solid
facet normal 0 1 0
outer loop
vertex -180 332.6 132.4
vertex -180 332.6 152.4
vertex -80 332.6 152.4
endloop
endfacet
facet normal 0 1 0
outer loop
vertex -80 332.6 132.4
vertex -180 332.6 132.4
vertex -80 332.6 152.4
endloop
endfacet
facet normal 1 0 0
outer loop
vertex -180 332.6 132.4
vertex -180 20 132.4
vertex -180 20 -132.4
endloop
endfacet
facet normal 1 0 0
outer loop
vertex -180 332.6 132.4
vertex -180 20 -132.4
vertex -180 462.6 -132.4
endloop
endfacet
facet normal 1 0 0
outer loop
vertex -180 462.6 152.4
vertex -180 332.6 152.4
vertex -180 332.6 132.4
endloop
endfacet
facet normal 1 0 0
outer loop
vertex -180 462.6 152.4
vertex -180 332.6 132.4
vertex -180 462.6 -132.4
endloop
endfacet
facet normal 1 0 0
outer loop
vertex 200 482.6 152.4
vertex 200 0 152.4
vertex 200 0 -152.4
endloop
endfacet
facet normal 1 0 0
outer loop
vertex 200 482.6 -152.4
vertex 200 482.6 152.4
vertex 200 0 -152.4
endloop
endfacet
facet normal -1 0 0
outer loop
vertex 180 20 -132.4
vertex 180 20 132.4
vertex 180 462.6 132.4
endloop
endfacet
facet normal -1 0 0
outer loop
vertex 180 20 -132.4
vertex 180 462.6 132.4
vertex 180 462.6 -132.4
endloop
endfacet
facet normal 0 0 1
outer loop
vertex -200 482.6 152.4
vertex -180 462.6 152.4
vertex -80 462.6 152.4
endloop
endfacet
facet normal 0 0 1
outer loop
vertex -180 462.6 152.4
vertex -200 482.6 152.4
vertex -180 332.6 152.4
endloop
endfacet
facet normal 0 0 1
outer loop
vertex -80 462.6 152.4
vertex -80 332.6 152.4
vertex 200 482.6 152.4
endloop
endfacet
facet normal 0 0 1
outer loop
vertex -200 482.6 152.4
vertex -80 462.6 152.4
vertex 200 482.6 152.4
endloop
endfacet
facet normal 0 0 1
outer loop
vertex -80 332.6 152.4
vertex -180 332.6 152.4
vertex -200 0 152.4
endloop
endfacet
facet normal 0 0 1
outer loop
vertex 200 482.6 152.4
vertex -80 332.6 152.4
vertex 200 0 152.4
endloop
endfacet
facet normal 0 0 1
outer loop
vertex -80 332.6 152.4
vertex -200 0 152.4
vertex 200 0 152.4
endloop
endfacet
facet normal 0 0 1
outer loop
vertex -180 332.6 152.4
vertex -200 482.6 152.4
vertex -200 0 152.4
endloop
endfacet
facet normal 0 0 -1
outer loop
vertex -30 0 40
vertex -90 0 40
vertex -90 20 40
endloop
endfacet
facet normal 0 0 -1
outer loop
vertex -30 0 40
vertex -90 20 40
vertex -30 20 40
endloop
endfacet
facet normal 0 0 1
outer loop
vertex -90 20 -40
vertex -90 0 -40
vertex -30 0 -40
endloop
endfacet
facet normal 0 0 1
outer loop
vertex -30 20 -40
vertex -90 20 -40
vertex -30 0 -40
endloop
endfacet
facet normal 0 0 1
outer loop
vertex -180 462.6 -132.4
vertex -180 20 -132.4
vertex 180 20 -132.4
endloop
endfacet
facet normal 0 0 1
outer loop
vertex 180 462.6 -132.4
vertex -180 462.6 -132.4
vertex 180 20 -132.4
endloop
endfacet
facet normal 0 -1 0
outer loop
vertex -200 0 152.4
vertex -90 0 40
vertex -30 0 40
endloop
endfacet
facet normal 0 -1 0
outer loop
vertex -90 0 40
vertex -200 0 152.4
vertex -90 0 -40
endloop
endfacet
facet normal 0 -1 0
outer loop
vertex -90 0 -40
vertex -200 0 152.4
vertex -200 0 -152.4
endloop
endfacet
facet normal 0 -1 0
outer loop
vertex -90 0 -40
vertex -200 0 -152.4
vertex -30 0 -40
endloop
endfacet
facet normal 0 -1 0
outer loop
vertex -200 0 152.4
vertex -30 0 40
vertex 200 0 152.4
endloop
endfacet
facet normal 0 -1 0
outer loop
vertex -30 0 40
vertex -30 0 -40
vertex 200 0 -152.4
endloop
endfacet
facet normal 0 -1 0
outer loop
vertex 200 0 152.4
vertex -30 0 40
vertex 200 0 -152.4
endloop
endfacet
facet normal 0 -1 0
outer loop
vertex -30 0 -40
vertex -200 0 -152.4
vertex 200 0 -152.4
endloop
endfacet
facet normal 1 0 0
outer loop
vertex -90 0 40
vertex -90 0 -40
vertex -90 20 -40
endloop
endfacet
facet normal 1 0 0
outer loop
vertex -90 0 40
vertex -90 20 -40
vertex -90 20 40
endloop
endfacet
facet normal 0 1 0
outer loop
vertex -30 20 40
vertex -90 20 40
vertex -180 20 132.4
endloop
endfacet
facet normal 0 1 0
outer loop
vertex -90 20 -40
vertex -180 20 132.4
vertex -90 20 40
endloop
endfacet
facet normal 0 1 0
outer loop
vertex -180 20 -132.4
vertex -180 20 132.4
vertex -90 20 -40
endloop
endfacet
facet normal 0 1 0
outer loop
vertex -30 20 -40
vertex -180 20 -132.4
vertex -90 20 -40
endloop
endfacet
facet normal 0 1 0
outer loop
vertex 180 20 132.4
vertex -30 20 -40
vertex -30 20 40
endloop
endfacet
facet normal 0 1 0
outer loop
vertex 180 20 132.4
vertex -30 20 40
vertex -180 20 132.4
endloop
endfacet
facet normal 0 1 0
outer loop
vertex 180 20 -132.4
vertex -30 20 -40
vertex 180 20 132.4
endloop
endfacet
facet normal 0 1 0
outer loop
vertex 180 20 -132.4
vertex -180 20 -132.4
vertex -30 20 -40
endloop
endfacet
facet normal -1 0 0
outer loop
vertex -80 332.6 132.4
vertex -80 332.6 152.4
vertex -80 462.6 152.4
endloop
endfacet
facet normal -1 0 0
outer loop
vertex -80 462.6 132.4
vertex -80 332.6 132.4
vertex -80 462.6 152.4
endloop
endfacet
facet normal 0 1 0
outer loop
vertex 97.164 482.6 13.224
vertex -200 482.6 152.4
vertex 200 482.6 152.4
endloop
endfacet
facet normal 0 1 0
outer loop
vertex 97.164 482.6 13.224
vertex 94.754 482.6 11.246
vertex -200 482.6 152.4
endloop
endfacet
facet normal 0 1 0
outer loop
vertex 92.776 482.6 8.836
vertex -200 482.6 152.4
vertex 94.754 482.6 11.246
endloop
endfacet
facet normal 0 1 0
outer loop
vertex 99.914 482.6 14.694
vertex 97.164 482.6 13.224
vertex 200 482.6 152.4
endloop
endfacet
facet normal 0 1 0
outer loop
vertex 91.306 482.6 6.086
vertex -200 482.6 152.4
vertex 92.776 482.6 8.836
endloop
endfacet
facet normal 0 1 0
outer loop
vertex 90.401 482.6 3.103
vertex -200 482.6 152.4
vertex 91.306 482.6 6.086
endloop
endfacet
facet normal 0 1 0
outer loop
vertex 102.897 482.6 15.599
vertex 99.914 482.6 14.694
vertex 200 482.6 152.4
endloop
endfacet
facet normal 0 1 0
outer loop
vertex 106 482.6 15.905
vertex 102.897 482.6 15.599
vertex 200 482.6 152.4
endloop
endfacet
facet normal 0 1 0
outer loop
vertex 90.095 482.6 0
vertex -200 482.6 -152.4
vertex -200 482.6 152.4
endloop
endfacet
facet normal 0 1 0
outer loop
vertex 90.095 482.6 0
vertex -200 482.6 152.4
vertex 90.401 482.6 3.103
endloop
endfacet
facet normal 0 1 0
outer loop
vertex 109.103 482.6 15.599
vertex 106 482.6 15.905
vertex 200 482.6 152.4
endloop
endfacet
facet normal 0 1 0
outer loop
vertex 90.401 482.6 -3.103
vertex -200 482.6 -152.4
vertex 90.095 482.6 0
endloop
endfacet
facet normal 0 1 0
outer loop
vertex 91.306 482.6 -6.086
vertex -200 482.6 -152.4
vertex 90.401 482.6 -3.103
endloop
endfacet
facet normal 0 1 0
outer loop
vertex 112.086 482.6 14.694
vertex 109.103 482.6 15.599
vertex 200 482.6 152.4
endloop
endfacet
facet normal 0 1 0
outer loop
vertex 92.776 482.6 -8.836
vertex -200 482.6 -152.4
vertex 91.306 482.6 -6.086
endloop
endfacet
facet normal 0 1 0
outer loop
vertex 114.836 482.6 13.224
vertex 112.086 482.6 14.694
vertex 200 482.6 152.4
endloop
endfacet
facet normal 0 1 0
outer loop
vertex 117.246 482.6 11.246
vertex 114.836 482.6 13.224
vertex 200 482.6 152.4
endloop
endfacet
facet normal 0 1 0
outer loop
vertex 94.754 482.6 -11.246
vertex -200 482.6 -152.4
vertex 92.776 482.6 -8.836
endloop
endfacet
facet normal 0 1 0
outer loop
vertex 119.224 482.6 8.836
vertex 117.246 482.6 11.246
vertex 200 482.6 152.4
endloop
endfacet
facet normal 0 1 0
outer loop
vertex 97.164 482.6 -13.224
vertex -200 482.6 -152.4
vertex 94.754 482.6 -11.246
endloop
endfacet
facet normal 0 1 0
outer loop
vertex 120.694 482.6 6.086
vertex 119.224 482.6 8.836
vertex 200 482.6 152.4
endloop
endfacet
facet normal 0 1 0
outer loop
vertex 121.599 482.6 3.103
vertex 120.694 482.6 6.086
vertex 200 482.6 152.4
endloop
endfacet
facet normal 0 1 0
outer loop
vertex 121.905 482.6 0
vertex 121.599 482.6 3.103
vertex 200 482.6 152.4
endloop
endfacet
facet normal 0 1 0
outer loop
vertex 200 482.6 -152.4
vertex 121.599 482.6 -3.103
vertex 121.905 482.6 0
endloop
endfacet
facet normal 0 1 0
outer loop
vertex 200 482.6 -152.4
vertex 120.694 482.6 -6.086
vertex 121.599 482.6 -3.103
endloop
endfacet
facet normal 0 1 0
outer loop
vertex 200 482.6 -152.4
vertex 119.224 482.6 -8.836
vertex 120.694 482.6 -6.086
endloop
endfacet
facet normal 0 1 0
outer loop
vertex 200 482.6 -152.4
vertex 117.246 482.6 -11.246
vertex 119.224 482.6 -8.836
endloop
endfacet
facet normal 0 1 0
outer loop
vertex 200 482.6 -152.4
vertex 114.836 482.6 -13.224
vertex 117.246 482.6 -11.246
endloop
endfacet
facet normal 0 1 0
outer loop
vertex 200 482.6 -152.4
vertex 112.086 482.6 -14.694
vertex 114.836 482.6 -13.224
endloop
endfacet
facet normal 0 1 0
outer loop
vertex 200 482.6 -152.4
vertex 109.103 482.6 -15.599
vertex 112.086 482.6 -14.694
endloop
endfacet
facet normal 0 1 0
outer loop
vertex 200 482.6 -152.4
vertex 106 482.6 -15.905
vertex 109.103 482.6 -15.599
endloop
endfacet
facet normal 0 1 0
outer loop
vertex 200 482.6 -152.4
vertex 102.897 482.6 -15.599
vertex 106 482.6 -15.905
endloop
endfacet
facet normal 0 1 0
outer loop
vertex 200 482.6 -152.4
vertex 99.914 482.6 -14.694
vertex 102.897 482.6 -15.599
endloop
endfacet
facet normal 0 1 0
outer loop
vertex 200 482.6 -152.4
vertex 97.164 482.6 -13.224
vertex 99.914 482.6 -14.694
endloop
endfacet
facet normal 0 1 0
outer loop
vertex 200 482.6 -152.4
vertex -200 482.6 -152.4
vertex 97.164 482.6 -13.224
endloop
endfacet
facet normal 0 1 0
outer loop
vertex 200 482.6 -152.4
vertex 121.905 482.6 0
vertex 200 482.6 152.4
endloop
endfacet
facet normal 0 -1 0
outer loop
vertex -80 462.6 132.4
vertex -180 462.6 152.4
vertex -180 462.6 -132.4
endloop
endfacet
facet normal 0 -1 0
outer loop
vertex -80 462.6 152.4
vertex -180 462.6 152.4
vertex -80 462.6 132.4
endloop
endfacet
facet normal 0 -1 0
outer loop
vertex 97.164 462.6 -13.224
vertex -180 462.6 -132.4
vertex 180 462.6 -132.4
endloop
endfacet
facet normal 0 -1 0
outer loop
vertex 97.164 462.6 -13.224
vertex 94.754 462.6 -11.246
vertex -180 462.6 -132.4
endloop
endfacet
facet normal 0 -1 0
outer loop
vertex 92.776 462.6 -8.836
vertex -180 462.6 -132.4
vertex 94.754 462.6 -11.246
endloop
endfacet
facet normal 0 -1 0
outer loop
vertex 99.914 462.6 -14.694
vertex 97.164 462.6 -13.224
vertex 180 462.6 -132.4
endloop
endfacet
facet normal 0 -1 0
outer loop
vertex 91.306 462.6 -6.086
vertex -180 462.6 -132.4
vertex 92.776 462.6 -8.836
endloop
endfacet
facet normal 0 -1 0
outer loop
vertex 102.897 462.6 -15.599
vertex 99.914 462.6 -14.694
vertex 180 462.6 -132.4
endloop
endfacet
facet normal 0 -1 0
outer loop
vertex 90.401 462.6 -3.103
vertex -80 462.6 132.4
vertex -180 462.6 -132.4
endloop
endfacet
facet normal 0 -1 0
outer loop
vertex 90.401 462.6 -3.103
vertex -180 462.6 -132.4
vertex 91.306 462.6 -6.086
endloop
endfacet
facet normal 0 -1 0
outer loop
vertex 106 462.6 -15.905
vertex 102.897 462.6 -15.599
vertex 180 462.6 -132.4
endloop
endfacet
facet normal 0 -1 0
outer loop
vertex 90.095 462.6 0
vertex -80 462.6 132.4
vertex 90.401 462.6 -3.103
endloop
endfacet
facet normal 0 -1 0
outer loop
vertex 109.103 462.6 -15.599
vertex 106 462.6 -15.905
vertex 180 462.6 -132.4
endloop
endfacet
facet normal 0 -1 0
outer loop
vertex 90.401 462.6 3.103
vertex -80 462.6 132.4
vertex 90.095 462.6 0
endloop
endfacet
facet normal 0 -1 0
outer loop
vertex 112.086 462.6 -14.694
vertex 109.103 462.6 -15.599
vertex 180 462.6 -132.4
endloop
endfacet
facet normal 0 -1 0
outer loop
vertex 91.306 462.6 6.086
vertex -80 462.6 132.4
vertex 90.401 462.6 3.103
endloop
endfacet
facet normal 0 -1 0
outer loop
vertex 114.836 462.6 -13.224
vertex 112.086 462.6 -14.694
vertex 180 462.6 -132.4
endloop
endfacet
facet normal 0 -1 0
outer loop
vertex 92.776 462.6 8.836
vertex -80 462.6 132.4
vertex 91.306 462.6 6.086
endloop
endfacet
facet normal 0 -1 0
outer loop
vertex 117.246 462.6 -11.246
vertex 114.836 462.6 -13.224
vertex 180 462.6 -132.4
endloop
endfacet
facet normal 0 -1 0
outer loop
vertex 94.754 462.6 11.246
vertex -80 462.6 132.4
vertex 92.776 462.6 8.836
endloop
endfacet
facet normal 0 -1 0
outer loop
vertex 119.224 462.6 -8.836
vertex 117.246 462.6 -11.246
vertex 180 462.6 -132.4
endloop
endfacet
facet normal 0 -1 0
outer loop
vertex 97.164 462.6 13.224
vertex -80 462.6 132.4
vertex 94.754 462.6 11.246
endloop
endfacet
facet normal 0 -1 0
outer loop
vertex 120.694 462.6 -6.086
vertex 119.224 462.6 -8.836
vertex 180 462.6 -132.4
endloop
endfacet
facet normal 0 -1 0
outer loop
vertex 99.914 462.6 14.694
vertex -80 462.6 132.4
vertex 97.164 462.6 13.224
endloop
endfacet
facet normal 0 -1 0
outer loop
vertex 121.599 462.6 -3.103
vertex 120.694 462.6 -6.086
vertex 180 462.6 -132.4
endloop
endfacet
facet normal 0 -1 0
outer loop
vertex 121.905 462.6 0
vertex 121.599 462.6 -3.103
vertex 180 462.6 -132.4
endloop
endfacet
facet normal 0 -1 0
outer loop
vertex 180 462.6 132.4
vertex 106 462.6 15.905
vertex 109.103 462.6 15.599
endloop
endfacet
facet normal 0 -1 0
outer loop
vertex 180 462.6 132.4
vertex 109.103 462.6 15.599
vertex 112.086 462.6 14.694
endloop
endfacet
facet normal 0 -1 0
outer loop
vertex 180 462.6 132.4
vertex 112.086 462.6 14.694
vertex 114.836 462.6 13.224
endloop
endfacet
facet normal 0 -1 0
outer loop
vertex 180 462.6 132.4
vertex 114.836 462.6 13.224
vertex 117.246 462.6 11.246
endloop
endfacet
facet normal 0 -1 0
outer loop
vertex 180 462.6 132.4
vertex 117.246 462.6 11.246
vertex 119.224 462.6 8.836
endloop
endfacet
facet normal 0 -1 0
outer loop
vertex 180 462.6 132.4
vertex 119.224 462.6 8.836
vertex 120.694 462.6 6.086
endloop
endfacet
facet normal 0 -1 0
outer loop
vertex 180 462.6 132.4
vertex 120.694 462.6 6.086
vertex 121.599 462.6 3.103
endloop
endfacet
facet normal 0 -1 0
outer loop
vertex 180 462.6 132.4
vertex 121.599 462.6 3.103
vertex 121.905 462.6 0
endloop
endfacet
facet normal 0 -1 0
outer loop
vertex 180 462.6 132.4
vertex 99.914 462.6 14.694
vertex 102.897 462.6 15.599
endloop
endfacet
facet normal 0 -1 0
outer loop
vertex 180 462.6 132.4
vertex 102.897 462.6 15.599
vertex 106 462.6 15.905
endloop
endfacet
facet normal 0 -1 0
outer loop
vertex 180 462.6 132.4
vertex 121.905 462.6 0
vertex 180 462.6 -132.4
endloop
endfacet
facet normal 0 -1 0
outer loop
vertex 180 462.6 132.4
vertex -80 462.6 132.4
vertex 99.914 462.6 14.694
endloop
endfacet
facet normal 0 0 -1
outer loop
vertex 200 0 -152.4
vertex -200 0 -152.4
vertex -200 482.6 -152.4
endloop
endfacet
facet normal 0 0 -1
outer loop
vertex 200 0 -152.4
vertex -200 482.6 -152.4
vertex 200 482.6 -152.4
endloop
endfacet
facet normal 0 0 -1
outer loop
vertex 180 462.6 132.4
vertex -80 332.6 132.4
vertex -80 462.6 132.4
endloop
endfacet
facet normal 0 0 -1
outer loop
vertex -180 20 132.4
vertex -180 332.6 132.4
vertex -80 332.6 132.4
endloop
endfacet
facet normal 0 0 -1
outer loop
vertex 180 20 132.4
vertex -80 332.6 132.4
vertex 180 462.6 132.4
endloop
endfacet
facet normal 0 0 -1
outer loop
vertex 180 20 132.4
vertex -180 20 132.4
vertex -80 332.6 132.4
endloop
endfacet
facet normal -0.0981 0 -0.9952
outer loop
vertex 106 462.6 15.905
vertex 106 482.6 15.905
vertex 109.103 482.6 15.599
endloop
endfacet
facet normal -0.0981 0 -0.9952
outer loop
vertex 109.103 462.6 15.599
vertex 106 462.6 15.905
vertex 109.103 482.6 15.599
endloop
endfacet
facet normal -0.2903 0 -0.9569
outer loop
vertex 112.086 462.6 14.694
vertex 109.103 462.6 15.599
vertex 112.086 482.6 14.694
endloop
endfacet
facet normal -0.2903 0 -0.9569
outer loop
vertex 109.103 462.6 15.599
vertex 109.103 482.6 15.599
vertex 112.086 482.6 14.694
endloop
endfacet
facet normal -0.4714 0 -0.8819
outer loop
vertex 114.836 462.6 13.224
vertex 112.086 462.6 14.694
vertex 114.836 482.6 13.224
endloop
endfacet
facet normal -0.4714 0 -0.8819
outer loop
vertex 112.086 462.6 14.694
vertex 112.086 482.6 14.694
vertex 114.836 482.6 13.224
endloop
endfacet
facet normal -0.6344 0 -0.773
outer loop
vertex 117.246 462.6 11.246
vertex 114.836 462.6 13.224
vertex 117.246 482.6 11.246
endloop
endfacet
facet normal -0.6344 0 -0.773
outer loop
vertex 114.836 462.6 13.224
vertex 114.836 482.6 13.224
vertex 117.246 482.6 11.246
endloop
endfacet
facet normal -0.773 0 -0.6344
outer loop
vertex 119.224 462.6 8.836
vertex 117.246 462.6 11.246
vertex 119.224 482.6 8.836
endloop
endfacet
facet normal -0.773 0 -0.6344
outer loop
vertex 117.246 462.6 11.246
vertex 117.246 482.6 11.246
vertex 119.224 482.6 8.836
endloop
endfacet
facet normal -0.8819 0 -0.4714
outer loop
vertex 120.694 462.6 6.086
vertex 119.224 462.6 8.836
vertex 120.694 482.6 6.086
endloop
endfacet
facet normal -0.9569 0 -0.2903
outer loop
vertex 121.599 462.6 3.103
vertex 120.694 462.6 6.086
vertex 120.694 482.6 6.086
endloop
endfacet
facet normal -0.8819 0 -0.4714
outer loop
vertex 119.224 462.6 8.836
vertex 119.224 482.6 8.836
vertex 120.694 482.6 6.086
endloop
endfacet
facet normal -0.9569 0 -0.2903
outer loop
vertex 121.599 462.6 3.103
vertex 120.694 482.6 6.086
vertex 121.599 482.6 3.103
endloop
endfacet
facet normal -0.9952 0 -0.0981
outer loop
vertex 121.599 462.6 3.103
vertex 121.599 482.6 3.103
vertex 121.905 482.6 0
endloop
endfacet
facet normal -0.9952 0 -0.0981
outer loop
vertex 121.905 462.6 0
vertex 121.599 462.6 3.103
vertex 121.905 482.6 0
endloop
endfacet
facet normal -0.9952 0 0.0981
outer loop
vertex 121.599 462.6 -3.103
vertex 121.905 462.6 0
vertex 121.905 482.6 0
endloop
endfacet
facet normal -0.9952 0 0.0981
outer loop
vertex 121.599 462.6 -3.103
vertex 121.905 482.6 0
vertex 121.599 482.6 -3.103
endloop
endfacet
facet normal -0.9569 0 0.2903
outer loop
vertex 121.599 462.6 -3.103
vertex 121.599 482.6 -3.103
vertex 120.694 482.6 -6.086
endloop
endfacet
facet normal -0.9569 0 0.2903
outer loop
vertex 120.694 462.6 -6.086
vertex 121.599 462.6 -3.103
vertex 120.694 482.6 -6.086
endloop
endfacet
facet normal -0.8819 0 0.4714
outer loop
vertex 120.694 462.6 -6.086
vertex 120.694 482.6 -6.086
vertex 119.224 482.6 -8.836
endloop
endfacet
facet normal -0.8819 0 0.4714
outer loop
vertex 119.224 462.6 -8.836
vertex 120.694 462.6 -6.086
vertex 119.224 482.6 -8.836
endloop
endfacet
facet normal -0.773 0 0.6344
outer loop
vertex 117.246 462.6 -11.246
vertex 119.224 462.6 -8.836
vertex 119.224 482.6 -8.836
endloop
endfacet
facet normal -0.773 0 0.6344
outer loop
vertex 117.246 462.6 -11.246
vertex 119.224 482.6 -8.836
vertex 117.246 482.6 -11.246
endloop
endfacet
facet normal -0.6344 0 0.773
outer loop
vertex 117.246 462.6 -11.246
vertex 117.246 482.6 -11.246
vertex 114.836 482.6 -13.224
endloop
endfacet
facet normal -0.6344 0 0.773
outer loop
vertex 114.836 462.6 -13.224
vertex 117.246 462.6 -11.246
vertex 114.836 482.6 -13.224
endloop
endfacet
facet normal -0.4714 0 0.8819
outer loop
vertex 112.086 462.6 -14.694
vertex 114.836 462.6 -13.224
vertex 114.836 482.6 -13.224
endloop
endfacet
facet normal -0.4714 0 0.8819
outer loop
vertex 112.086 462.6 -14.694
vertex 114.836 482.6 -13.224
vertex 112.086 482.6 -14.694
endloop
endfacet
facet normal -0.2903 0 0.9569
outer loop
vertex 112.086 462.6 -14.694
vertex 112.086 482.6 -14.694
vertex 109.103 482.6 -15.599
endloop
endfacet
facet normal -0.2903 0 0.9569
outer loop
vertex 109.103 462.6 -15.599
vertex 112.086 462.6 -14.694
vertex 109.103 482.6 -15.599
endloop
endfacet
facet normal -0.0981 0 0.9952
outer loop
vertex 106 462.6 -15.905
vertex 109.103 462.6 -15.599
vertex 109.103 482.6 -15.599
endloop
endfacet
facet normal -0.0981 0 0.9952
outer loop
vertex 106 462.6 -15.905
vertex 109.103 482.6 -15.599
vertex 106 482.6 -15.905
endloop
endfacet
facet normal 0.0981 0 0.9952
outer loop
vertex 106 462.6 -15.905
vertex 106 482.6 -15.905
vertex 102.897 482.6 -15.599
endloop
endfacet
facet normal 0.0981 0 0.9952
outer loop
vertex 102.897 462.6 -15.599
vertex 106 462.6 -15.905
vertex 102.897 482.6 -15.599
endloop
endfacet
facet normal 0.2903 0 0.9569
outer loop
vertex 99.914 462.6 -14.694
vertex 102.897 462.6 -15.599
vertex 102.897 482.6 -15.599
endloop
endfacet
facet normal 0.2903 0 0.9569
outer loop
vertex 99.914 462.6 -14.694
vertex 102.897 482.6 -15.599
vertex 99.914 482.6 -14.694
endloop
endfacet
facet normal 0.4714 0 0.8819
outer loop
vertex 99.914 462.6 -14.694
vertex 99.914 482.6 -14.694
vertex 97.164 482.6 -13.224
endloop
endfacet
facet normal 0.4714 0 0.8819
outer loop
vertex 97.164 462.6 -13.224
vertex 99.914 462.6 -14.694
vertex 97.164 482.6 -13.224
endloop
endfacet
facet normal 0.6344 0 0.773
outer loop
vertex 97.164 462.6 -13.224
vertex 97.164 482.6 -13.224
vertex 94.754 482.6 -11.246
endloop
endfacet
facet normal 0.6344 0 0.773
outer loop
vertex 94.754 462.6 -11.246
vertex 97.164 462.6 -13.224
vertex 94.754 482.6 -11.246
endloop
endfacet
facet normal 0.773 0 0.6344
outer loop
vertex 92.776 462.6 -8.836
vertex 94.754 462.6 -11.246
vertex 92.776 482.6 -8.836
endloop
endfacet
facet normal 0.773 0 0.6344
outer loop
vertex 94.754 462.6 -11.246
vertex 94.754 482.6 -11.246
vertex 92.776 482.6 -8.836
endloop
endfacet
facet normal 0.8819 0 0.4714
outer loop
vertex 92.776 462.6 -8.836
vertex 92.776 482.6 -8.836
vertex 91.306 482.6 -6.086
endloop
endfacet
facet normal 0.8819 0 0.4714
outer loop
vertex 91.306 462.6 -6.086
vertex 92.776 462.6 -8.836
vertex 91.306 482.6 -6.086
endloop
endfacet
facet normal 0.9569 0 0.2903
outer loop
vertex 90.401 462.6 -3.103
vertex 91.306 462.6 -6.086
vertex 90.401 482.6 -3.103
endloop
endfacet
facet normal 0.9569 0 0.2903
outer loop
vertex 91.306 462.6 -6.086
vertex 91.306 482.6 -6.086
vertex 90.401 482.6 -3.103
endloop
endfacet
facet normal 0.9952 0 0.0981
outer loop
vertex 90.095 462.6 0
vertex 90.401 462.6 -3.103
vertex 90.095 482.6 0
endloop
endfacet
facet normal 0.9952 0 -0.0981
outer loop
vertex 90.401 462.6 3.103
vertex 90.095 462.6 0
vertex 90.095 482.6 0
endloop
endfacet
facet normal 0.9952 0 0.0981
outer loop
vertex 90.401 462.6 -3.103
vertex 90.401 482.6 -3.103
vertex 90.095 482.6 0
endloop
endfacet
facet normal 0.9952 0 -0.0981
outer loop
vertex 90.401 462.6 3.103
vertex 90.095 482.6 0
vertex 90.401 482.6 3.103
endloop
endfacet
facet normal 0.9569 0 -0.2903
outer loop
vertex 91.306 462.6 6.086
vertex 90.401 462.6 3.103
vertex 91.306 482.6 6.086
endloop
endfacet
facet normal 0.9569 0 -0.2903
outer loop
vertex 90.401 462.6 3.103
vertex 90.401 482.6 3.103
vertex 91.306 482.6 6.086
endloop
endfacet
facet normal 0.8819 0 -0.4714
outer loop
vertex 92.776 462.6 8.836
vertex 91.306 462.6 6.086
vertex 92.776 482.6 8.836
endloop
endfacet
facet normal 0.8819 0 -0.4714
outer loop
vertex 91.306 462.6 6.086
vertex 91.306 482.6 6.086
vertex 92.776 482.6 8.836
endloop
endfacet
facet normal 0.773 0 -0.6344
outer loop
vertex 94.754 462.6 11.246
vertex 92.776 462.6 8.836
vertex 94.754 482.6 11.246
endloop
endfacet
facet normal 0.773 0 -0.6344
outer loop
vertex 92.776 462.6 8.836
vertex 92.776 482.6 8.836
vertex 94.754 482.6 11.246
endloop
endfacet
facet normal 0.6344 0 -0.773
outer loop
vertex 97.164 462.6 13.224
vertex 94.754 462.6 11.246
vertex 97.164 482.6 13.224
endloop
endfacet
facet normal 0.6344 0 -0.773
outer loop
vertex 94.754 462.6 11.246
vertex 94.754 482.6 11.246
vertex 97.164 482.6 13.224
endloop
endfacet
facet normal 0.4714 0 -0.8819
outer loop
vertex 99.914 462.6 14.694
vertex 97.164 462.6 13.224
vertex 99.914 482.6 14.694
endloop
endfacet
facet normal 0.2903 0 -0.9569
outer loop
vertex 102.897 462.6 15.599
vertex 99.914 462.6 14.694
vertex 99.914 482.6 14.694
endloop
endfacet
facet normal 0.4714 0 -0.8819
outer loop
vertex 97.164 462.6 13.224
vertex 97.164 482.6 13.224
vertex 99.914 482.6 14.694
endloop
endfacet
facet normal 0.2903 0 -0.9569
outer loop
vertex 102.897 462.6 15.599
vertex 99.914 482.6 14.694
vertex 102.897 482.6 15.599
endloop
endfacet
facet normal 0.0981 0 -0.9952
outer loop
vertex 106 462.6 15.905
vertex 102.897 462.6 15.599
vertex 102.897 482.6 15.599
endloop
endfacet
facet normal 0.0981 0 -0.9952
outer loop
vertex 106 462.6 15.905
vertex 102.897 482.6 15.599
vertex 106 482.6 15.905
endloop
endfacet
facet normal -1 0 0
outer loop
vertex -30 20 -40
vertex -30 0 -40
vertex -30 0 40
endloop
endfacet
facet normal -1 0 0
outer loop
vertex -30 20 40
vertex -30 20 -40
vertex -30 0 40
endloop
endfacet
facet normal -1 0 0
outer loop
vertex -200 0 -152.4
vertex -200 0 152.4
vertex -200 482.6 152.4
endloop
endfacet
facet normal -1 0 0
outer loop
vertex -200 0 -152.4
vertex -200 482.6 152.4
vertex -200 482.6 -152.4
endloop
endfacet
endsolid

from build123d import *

# Parameters (mm, degrees)
SKETCH1_W           = 400
SKETCH1_H           = 304.8
BOSS_EXTRUDE1_DEPTH = 482.6
SHELL1_T            = 20
CUT_EXTRUDE1_REACH  = 546.177
SKETCH2_R           = 15.904700308
SKETCH3_W           = 100
SKETCH3_H           = 130
CUT_EXTRUDE2_DEPTH  = 50
SKETCH4_W           = 60
SKETCH4_H           = 80
CUT_EXTRUDE3_DEPTH  = 30


with BuildPart() as part:
    # Sketch1 → Boss-Extrude1 (new body)
    with BuildSketch(Plane(origin=(0, 0, 0), x_dir=(1, 0, 0), z_dir=(0, 1, 0))):
        Rectangle(SKETCH1_W, SKETCH1_H)
    extrude(amount=BOSS_EXTRUDE1_DEPTH)

    # Shell1 (no face opened: a closed hollow body)
    add(offset(amount=-SHELL1_T, mode=Mode.PRIVATE), mode=Mode.SUBTRACT)

    # Sketch2 → Cut-Extrude1 (cut, up to next)
    with BuildSketch(Plane(origin=(0, 482.6, 0), x_dir=(1, 0, 0), z_dir=(0, 1, 0)), mode=Mode.PRIVATE) as cut_extrude1_sk1:
        with Locations(Location((106, 0, 0), (0, 0, 270))):
            Circle(SKETCH2_R)
    cut_extrude1_tool1 = extrude(cut_extrude1_sk1.sketch, amount=-CUT_EXTRUDE1_REACH, mode=Mode.PRIVATE) & part.part
    add(cut_extrude1_tool1.solids().sort_by_distance((106, 482.6, 0))[0], mode=Mode.SUBTRACT)

    # Sketch3 → Cut-Extrude2 (cut)
    with BuildSketch(Plane.XY.offset(152.4)):
        with Locations((-130, 397.6)):
            Rectangle(SKETCH3_W, SKETCH3_H)
    extrude(amount=-CUT_EXTRUDE2_DEPTH, mode=Mode.SUBTRACT)

    # Sketch4 → Cut-Extrude3 (cut)
    with BuildSketch(Plane.XZ):
        with Locations((-60, 0)):
            Rectangle(SKETCH4_W, SKETCH4_H)
    extrude(amount=-CUT_EXTRUDE3_DEPTH, mode=Mode.SUBTRACT)


solid = part.part
